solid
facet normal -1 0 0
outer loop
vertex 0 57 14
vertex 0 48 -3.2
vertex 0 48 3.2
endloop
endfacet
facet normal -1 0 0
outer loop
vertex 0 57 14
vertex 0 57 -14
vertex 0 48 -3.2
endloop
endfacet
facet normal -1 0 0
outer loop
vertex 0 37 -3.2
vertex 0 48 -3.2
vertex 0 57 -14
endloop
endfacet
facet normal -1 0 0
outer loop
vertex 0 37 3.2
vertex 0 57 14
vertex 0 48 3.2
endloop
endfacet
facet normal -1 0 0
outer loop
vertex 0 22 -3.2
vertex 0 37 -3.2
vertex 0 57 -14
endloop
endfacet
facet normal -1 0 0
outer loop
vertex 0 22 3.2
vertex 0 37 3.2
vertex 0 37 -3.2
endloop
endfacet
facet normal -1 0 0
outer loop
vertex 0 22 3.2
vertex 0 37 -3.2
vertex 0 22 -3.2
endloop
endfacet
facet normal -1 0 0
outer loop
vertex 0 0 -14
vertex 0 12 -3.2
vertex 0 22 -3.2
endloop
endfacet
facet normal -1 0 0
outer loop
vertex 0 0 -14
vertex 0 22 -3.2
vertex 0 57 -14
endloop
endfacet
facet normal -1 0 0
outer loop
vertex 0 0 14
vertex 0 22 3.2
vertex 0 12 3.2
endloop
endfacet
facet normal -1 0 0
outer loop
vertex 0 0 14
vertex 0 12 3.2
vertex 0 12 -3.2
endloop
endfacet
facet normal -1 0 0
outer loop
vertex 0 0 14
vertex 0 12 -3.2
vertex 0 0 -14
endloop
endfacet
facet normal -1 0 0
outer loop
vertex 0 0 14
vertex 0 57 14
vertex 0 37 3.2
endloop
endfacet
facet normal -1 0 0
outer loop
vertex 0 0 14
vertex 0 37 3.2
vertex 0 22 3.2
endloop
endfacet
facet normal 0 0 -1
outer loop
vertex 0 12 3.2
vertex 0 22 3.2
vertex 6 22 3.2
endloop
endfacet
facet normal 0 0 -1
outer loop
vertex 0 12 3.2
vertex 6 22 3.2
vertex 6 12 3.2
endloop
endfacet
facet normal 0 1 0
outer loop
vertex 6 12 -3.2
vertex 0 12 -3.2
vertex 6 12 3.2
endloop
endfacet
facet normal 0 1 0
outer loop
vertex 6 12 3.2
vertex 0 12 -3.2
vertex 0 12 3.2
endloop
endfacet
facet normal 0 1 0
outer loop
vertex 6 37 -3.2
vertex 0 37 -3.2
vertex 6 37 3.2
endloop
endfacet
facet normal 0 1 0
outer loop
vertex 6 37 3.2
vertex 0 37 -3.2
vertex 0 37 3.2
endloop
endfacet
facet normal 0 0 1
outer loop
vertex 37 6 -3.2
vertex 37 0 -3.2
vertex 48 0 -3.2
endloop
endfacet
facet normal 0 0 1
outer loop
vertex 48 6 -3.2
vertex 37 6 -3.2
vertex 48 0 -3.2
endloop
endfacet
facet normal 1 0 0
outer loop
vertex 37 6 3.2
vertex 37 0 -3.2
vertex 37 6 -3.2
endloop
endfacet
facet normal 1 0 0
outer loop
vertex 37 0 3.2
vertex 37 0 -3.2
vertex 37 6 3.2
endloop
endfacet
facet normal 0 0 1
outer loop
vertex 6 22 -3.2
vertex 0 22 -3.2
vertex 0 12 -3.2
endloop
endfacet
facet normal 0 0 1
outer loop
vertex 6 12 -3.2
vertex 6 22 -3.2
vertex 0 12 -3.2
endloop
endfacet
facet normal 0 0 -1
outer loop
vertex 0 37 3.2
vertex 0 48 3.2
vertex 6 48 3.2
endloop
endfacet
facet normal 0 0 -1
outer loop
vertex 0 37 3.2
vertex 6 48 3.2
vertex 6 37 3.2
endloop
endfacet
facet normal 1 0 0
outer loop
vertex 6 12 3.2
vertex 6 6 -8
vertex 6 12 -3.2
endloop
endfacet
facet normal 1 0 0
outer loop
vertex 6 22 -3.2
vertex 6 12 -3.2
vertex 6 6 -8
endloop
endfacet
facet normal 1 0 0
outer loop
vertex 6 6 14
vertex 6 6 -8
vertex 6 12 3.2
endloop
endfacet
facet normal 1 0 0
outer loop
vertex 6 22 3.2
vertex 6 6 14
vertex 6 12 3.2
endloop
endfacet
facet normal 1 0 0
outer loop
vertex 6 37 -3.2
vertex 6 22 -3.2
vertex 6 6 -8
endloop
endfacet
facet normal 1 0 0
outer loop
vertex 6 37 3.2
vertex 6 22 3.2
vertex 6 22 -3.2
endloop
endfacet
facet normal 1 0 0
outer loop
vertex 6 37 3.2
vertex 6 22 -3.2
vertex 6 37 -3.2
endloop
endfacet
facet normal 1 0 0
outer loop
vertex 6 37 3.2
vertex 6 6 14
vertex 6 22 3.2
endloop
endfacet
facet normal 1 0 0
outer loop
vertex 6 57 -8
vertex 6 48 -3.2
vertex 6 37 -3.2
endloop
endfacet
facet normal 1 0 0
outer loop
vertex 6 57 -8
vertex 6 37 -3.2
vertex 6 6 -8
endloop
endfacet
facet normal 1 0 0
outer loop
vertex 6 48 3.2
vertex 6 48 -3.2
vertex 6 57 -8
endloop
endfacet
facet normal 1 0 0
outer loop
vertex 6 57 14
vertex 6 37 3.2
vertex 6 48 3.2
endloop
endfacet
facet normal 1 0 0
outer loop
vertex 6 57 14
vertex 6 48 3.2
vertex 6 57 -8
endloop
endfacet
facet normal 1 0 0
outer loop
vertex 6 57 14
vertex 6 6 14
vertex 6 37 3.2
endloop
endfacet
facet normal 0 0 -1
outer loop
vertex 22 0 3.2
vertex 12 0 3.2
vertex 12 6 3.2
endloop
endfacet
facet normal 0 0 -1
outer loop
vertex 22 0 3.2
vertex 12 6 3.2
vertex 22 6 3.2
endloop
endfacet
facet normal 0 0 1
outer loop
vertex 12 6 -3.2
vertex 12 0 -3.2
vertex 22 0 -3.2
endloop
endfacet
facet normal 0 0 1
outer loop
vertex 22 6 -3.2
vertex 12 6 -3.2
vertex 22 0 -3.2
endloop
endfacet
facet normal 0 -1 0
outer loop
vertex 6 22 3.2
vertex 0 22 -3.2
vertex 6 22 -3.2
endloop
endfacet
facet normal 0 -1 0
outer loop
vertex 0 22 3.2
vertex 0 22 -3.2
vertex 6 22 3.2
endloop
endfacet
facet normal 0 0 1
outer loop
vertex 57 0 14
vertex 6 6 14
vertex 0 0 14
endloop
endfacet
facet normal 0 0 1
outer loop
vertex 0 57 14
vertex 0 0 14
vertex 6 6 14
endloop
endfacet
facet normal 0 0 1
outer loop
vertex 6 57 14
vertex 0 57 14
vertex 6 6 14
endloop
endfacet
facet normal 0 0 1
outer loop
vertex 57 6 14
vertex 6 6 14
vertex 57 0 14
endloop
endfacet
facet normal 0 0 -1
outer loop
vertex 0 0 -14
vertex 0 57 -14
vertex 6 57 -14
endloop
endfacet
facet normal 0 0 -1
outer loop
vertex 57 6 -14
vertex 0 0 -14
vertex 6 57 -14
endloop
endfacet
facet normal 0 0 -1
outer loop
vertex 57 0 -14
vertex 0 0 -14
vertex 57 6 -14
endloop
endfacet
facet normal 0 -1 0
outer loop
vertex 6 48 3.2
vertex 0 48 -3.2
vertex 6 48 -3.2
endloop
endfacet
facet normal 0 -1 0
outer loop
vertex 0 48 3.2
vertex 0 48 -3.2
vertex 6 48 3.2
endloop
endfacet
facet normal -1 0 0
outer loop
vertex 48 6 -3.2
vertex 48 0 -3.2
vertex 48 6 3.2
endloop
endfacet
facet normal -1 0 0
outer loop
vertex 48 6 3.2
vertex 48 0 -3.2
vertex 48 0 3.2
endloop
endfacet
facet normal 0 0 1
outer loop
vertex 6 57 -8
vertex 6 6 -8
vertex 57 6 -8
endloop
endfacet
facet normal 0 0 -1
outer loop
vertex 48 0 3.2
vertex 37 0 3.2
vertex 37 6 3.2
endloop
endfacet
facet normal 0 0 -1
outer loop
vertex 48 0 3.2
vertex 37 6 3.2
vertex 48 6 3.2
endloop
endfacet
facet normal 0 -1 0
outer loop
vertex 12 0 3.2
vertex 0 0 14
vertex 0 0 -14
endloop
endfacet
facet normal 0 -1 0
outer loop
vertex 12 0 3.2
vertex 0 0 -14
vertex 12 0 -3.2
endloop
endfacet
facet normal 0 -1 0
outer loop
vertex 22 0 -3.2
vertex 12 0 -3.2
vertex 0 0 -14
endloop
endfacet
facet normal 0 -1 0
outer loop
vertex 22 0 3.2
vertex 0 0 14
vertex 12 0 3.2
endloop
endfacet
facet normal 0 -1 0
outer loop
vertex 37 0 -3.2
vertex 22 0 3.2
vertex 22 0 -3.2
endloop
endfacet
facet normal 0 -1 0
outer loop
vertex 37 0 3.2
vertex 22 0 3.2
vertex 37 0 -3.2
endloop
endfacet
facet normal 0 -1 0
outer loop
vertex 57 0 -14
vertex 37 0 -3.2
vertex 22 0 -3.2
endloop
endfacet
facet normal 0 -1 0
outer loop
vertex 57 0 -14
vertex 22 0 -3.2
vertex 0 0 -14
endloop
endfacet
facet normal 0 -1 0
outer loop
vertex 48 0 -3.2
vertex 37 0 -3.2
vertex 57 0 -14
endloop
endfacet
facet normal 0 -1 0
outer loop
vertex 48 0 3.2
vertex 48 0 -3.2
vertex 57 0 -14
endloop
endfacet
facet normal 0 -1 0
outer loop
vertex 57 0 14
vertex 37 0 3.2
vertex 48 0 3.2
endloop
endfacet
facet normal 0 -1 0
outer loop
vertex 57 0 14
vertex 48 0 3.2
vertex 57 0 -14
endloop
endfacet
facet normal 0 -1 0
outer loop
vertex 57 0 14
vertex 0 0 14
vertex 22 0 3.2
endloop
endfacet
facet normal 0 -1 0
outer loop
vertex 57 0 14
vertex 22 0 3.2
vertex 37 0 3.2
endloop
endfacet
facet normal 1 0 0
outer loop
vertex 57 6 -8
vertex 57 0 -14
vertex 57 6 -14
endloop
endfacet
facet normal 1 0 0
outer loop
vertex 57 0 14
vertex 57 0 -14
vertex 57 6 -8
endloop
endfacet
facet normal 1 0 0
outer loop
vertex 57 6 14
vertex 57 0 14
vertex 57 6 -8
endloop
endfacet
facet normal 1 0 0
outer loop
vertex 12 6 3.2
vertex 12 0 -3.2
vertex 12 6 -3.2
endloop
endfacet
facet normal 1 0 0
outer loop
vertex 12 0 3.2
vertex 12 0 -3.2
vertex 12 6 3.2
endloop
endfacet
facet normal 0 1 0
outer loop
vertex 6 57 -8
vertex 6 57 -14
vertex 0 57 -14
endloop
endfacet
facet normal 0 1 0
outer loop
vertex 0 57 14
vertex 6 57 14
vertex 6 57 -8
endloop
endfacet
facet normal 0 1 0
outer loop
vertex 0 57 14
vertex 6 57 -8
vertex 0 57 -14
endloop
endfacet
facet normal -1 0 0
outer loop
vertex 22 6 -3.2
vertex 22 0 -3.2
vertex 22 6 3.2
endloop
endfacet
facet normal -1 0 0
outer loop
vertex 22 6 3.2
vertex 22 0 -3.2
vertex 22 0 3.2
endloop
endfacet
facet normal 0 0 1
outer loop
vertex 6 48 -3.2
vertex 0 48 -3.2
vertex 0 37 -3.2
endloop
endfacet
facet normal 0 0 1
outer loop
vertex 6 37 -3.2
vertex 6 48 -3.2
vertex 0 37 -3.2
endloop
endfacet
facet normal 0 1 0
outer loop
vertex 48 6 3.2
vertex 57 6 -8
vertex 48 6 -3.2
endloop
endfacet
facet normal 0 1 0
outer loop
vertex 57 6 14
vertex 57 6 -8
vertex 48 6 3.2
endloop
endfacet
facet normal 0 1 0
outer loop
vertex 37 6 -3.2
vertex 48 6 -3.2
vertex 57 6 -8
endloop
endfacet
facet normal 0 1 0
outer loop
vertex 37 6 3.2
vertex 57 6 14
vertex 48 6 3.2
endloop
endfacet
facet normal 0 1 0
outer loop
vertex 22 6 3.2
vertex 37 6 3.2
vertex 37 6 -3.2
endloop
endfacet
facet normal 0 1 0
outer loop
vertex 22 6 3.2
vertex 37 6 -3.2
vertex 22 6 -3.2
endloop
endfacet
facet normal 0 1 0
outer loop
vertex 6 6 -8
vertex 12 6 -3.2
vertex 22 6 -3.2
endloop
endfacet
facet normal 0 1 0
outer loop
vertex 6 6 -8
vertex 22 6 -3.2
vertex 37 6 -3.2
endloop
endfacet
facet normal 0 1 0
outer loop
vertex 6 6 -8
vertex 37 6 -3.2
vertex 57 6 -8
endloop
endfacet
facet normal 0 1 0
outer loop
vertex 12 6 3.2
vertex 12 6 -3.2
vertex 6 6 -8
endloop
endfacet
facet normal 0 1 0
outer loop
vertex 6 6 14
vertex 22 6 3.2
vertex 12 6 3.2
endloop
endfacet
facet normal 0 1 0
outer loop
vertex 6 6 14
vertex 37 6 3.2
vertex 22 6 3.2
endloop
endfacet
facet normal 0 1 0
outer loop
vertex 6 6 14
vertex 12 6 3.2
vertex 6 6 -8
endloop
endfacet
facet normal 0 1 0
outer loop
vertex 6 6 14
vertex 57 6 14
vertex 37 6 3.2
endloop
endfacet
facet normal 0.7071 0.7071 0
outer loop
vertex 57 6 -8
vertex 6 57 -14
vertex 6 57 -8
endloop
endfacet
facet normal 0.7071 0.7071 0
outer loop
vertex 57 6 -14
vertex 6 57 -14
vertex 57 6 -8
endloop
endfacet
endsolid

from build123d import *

# Parameters (mm, degrees)
F1_DEPTH = 14
F2_W     = 10
F2_H     = 6.4
F2_W_2   = 11
F3_DEPTH = 25
F5_DEPTH = 6
F6_W     = 10
F6_H     = 6.4
F6_W_2   = 11
F7_DEPTH = 25


with BuildPart() as f1:
    # F0 (on Top) → F1 (new body, symmetric)
    with BuildSketch(Plane.XY):
        Polygon((6, 57), (0, 57), (0, 0), (57, 0), (57, 6), (6, 6), align=None)
    extrude(amount=F1_DEPTH, both=True)

    # F2 (on face) → F3 (cut)
    with BuildSketch(Plane(origin=(0, 0, 0), x_dir=(0, -1, 0), z_dir=(-1, 0, 0))):
        with Locations((-17, 0)):
            Rectangle(F2_W, F2_H)
        with Locations((-42.5, 0)):
            Rectangle(F2_W_2, F2_H)
    extrude(amount=-F3_DEPTH, mode=Mode.SUBTRACT)

    # F4 (on face) → F5 (join)
    with BuildSketch(Plane(origin=(0, 0, -14), x_dir=(1, 0, 0), z_dir=(0, 0, -1))):
        Polygon((6, -57), (57, -6), (6, -6), align=None)
    extrude(amount=-F5_DEPTH)

    # F6 (on face) → F7 (cut)
    with BuildSketch(Plane.XZ):
        with Locations((17, 0)):
            Rectangle(F6_W, F6_H)
        with Locations((42.5, 0)):
            Rectangle(F6_W_2, F6_H)
    extrude(amount=-F7_DEPTH, mode=Mode.SUBTRACT)


solid = f1.part
